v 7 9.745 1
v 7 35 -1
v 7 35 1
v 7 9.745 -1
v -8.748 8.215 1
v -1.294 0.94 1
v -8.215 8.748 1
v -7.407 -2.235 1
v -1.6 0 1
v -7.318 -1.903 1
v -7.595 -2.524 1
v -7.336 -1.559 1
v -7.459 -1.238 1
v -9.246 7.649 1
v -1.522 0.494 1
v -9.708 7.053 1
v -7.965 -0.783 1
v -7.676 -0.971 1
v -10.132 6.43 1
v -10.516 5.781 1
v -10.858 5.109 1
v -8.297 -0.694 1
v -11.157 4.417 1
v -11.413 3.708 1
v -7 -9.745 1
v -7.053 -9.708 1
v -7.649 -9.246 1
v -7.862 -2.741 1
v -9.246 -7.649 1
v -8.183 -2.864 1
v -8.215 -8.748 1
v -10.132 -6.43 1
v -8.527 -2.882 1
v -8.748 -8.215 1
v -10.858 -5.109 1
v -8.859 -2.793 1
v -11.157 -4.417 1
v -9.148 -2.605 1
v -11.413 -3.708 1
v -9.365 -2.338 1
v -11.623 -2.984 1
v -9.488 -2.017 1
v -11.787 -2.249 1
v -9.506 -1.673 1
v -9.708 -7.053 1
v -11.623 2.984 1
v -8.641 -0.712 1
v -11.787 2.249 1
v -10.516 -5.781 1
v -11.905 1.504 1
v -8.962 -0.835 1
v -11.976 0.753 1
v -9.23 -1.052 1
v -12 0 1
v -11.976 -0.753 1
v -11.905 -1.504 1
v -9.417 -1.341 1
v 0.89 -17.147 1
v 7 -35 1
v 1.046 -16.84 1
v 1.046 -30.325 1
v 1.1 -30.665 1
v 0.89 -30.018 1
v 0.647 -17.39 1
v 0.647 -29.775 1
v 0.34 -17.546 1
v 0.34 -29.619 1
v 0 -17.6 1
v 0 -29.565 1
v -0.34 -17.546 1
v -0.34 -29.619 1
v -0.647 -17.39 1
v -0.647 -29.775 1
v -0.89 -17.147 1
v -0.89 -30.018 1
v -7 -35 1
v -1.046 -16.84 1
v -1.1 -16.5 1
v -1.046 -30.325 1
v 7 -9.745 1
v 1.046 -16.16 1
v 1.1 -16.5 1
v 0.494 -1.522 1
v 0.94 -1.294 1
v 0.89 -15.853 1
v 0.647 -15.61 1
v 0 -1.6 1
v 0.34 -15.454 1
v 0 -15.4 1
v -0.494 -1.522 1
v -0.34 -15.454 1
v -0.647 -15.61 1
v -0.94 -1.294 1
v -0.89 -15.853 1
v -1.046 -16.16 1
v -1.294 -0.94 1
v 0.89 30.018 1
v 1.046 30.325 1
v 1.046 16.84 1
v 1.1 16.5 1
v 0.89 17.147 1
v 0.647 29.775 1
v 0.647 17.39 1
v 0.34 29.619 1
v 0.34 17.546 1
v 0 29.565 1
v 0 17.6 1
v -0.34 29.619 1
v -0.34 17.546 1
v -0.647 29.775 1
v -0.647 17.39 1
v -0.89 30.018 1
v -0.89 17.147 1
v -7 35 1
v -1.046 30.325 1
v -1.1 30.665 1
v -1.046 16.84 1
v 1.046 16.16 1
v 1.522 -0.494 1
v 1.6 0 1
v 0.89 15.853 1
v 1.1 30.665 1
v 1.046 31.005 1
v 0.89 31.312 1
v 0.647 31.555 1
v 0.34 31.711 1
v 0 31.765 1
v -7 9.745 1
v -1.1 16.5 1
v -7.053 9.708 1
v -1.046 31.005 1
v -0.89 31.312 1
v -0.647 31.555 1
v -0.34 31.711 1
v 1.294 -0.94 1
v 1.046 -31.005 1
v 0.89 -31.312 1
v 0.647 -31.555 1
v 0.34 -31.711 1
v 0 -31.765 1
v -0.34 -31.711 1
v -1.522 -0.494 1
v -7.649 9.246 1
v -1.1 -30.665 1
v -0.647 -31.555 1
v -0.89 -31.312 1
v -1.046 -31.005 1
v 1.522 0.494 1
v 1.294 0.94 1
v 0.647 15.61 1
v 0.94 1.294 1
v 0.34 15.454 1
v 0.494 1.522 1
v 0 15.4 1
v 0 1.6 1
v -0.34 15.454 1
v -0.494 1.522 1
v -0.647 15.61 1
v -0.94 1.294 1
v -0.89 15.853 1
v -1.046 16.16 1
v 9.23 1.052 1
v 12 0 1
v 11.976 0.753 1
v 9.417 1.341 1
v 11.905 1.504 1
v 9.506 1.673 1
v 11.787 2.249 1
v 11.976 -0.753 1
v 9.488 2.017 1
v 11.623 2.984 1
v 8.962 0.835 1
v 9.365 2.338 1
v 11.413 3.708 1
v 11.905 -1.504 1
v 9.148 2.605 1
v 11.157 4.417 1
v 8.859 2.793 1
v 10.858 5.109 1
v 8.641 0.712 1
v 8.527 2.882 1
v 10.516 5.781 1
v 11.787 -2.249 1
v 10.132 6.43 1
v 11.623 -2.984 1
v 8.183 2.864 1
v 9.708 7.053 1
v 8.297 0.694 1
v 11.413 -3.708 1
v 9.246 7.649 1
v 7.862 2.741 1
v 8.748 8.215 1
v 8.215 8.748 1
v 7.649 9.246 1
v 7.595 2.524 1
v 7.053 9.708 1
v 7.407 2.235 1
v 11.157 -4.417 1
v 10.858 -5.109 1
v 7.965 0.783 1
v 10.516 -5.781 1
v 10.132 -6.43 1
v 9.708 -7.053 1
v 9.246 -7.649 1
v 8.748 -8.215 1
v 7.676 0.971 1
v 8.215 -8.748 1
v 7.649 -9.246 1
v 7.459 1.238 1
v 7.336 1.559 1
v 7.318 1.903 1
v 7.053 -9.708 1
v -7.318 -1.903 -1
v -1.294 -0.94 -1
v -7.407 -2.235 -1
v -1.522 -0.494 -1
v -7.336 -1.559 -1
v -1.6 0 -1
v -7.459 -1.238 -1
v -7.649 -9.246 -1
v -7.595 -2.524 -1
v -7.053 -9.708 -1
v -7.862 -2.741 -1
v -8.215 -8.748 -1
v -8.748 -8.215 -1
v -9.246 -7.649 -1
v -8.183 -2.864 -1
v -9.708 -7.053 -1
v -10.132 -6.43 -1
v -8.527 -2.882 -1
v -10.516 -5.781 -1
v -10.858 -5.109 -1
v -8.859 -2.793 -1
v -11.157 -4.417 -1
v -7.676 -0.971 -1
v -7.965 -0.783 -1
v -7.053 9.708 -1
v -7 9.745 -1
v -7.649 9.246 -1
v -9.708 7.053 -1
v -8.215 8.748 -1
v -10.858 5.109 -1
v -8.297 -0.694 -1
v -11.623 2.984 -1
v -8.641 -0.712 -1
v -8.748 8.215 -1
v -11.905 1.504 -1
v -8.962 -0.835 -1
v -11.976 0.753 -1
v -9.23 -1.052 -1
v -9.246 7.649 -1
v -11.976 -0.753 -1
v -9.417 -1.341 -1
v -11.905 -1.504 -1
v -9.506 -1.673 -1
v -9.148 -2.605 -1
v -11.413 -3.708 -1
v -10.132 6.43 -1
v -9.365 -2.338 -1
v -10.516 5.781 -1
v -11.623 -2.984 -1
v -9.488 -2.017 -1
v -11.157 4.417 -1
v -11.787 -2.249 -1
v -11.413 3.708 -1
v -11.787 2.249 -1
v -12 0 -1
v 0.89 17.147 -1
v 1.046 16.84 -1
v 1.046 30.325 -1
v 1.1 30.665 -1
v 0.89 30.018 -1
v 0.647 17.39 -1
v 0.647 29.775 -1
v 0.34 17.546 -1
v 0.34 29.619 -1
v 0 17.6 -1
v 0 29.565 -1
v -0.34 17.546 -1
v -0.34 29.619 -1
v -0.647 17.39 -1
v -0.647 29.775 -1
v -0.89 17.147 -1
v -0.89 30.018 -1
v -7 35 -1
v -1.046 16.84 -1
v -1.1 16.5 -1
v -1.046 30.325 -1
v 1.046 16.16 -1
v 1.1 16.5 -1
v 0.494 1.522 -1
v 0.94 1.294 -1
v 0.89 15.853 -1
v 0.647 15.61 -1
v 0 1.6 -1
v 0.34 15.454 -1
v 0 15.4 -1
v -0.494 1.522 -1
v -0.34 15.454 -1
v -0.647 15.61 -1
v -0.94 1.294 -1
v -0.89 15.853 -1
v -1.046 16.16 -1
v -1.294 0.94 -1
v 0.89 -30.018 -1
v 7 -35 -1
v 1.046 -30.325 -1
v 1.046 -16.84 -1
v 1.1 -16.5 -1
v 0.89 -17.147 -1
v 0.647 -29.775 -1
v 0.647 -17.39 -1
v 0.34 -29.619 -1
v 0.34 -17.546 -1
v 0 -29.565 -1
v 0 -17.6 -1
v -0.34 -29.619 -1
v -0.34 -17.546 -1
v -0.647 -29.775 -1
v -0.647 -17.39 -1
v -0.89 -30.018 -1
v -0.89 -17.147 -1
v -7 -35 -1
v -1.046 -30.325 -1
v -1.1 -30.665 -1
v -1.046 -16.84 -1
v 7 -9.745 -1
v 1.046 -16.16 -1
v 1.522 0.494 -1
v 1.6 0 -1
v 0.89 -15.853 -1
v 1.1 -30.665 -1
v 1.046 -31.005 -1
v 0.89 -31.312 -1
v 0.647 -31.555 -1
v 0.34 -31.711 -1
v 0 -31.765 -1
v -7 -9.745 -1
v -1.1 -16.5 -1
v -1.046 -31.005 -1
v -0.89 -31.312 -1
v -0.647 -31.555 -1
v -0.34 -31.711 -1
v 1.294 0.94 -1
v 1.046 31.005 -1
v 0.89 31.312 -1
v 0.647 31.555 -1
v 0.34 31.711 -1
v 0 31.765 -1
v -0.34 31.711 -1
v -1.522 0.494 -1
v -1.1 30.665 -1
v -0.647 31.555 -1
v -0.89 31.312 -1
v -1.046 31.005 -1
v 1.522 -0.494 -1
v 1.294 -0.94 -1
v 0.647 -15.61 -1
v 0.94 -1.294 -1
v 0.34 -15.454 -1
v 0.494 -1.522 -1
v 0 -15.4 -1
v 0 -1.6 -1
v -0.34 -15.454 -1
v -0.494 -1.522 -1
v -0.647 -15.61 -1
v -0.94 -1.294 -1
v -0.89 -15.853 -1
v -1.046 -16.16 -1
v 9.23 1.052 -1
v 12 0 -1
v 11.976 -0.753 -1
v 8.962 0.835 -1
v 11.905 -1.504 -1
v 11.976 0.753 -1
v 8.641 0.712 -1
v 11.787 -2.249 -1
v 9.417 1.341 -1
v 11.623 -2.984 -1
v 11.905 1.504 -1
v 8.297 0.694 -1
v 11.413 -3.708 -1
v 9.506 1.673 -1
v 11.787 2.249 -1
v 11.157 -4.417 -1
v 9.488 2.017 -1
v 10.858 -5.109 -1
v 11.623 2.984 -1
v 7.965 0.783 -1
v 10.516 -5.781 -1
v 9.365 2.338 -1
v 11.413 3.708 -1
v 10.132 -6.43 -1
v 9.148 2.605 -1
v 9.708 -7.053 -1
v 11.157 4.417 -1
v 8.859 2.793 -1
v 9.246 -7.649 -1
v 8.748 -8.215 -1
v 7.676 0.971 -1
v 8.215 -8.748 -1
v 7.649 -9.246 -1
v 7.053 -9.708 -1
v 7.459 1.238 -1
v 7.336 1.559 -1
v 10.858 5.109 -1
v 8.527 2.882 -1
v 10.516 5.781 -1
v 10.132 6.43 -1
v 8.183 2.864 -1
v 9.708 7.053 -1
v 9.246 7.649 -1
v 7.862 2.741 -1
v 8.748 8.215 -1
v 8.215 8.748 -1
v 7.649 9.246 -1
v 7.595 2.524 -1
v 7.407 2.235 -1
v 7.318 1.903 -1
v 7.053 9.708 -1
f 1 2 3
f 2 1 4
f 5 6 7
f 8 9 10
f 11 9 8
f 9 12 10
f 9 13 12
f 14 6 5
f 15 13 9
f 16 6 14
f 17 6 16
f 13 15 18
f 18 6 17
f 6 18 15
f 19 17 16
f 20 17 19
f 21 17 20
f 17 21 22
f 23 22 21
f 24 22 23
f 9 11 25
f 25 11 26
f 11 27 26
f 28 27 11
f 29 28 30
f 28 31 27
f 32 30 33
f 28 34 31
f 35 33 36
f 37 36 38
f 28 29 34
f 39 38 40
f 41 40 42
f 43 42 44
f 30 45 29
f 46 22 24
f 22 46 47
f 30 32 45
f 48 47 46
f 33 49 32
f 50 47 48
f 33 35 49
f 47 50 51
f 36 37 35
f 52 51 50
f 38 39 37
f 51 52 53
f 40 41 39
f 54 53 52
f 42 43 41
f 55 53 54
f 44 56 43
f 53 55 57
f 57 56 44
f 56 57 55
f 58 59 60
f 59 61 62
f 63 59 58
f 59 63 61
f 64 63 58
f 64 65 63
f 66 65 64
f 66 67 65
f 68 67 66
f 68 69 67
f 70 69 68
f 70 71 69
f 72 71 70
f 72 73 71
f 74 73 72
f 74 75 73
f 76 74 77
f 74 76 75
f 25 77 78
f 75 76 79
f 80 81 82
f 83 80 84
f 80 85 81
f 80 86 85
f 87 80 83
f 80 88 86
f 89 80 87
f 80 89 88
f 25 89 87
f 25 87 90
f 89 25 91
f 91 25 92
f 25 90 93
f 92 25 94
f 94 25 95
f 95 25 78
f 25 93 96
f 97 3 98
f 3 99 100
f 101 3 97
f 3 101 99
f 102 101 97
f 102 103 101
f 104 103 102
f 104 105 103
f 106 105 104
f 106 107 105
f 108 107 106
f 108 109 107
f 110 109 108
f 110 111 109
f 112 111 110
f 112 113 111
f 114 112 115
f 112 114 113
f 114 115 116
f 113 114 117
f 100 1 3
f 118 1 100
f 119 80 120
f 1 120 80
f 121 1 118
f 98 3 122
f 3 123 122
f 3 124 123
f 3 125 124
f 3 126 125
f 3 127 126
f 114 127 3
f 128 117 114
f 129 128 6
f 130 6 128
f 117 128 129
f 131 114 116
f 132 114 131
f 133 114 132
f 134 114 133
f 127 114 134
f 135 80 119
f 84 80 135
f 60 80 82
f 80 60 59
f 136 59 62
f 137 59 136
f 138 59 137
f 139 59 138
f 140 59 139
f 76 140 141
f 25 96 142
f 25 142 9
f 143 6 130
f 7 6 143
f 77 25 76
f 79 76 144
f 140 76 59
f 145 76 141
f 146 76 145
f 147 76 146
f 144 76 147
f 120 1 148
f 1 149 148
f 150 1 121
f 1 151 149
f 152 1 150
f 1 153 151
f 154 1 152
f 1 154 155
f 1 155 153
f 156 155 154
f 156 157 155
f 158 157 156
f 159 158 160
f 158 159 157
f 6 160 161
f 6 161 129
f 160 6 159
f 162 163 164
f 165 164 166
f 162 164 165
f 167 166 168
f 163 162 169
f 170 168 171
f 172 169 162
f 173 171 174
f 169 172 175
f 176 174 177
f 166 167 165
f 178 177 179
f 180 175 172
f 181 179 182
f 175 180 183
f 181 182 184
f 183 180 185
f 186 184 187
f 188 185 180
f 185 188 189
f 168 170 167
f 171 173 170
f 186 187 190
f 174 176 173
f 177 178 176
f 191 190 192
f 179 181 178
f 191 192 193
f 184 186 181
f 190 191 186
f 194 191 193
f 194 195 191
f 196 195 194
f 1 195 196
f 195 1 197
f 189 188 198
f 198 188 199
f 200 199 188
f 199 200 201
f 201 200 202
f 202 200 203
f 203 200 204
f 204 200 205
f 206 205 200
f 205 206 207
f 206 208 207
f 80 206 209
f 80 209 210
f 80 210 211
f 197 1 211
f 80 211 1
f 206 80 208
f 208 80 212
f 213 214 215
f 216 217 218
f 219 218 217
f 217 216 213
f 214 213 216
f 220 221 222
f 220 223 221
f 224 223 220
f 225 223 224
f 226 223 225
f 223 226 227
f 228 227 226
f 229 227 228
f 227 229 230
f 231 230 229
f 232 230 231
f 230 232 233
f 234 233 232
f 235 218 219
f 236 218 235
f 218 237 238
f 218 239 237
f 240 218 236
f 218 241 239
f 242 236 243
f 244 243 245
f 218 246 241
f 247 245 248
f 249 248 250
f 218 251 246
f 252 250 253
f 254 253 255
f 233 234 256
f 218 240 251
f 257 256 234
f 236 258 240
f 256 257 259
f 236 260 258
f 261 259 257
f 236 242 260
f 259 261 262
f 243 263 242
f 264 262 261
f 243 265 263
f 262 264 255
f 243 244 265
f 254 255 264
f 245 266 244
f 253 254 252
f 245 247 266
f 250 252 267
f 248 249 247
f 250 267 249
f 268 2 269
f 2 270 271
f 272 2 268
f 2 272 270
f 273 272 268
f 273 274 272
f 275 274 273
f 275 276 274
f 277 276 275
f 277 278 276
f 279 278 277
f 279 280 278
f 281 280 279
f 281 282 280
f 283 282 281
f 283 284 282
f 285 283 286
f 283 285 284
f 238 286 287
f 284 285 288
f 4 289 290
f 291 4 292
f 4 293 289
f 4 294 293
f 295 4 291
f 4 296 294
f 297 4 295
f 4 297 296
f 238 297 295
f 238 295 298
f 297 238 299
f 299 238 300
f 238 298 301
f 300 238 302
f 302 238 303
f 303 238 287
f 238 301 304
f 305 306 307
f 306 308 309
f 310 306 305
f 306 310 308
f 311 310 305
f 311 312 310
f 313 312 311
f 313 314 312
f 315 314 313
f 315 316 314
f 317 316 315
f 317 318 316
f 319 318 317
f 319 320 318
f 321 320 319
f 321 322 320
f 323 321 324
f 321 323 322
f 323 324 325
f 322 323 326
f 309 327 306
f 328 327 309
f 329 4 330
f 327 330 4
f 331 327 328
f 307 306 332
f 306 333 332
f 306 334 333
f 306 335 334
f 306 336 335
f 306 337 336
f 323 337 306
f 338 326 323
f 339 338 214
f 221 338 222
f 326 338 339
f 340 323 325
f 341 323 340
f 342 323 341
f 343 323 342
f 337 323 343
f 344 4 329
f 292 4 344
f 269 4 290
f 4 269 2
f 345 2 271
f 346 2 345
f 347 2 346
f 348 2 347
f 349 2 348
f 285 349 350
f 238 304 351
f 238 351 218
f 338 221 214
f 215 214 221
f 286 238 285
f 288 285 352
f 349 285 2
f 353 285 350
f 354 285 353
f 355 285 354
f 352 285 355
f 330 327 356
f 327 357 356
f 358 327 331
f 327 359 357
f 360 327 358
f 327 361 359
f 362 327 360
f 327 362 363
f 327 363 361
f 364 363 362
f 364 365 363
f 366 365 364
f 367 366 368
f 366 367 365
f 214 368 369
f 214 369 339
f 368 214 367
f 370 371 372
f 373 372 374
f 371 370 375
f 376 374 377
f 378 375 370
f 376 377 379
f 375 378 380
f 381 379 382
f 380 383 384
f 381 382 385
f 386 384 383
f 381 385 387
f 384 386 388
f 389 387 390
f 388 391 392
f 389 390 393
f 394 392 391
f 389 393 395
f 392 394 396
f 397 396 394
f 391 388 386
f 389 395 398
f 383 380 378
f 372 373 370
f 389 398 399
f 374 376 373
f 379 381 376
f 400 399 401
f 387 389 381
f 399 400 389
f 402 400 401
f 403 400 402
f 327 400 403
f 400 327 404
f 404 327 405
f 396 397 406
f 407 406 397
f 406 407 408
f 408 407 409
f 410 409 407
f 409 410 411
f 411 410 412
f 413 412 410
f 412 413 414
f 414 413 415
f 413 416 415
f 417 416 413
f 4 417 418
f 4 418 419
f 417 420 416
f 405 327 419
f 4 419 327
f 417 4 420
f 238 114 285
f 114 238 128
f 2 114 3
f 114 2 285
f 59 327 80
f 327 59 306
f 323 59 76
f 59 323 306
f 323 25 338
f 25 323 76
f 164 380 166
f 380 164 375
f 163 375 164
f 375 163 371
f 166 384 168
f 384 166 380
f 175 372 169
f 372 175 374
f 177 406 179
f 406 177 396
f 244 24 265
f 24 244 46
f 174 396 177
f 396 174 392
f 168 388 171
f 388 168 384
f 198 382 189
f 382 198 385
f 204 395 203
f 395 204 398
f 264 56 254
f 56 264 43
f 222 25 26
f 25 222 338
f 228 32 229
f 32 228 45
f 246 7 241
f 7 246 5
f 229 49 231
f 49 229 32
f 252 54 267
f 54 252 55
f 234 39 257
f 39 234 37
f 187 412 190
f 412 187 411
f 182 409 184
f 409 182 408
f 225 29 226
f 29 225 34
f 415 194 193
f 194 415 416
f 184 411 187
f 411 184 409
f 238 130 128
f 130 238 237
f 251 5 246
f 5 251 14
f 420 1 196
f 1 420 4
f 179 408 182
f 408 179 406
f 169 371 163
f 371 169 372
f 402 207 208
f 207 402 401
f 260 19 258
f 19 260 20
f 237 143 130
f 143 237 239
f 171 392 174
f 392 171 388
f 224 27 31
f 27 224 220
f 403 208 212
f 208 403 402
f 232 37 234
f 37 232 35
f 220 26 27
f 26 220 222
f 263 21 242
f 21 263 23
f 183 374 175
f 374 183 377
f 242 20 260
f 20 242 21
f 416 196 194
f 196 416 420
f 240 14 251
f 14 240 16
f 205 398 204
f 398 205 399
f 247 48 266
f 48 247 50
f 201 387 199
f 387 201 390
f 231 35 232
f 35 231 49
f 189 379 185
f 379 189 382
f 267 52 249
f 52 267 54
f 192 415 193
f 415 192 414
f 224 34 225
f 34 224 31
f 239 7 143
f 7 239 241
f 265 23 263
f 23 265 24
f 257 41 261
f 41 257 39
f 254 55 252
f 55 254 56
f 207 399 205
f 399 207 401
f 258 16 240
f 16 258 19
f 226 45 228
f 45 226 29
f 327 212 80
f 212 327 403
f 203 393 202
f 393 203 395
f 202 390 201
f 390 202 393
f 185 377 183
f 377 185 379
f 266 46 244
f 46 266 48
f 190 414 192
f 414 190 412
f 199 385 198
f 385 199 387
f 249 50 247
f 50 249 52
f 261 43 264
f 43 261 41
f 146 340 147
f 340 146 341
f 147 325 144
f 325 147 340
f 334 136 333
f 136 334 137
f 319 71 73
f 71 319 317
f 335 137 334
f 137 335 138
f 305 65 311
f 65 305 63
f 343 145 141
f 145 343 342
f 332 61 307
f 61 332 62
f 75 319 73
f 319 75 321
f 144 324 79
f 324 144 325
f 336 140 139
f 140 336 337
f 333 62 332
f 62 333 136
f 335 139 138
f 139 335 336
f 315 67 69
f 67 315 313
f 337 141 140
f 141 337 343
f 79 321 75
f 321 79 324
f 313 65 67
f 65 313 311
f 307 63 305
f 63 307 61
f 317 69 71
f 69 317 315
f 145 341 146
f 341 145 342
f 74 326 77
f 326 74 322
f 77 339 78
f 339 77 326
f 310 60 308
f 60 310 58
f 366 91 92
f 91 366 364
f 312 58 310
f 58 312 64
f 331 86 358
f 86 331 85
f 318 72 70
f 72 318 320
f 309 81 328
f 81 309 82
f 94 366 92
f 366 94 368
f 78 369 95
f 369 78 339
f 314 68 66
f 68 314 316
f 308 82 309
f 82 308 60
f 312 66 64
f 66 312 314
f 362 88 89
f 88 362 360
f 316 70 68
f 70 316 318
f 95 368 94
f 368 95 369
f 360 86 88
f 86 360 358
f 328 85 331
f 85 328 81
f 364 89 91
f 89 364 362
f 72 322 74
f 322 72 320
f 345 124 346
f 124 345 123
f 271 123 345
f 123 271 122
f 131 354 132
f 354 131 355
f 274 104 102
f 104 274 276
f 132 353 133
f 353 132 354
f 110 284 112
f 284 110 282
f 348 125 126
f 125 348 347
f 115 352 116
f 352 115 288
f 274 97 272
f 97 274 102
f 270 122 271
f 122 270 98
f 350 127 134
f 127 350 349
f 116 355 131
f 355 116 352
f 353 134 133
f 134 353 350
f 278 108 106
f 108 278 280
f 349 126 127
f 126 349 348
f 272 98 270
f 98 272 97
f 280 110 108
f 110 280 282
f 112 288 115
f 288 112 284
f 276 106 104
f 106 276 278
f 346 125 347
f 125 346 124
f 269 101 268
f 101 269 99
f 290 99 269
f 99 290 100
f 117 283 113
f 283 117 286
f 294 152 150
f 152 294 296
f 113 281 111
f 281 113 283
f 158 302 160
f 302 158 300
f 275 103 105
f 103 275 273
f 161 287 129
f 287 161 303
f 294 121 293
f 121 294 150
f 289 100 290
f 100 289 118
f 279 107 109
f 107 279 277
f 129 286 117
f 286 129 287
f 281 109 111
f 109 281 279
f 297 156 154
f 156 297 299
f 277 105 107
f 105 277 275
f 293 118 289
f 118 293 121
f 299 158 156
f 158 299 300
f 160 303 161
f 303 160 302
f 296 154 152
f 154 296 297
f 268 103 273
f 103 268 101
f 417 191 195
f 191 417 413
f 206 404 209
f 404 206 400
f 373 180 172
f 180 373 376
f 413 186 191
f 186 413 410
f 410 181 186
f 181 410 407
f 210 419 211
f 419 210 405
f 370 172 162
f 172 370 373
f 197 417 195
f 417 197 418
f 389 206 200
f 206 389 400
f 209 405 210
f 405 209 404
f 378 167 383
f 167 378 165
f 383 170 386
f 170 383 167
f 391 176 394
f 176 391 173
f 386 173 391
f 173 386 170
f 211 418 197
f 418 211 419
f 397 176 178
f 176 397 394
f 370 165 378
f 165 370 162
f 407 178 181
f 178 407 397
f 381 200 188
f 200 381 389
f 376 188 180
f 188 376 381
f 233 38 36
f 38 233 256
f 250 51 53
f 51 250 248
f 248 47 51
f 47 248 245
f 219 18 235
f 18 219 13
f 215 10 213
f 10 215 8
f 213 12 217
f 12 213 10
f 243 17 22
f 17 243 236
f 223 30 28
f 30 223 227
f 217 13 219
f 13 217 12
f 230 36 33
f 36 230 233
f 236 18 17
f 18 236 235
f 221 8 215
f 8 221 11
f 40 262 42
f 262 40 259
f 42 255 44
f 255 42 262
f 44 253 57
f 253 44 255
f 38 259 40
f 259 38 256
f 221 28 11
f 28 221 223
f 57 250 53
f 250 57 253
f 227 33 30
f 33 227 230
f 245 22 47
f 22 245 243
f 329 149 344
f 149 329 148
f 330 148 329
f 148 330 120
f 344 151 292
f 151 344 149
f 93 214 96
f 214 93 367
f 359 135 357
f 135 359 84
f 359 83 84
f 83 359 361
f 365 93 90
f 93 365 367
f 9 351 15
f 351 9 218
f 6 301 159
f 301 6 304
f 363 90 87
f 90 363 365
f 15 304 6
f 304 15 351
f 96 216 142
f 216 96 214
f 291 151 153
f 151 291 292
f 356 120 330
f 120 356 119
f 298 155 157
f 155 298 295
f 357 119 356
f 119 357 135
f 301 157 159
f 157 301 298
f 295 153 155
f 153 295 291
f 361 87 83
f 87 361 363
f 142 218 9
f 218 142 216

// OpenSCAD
// file: ../../parameters.scad
global_clearance = 0.5;


//Main tube diameter - hole [mm]
main_tube_outer_diameter = 25.4;
main_tube_inner_diameter = 23.05;

// Nastavení parametrů rotoru

gliding_aggle = 14;         // tenhle úhel by se zřejmě v budoucnu měl počítat z požadované klouzavosti.

rotor_blade_AOA = 1.5;      // nastavení úhlu náběhu rotorového listu
rotor_blade_length = 970;   // délka rotorového listu
rotor_blade_depth = 50;     // hloubka rotorového listu
rotor_height = 180;         // výška otočného kloubu rotoru nad hlavní trubkou vírníku (odhad)
rotor_blades_count = 2;
rotor_delta_angle = 12;


rotor_head_width =  21.4;    //Rozměr 1 v nákresu
pilon_wall_thickness = 4.2;  // Rozměr 2 v nákresu
horizontal_screw_distance = 14.5;   // Rozměr 4 v nákresu
vertical_screw_distance = 12;       // rozměr 5 v nkresu

rotorhead_wall_thickness = 2; // sila tistenych dilu


bearing_outer_diameter = 7.1;    // Rozměr B1 v nákresu s přídavkem na toleranci otvoru
bearing_thickness = 3.1;        // Rozměr B2 v nákresu
bearing_shaft_length = 19.5;    // Rozměr B3 v nákresu


// nastavení parametrů motoru

engine_angle = -8;
engine_diameter = 55;
engine_offset = 55;

engine_screws_radius = 15;
engine_holes_radius = (24 + 44)/4;
engine_shatf_hole_diameter = 13;

// screw length step - minimum difference in length between two types of screws
basic_screw_length = 5;

//Screw diameter and nut for M5 [mm]
M5_screw_diameter=5.5;
M5_head_height = 5;
M5_head_diameter = 13+0.5;
M5_nut_height = 4.5;
M5_nut_diameter = 9.4;
M5_nut_pocket = 8.4;

//Screw diameter and nut for M4 [mm]
M4_screw_diameter=4.5;
M4_screw_head_height = 4;
M4_nut_height = 3.2;
M4_nut_diameter = 8.4;
M4_nut_pocket = 7.5;

//Screw diameter and nut for M3 [mm]
M3_screw_diameter = 3.2;
M3_nut_height = 2.7;
M3_nut_diameter = 6.6;
M3_screw_head_height = 3;
M3_nut_pocket = 5.6;


//Screw diameter and nut for M2,5 [mm]
M2_5_screw_diameter = 2.7;
M2_5_nut_height = 2.3;
M2_5_nut_diameter = 6;
M2_5_nut_pocket = 5.1;

//Screw diameter and nut for M2 [mm]
M2_screw_diameter = 2.2;
M2_nut_height = 1.8;
M2_nut_diameter = 4.5;
M2_nut_pocket = 3.95;



//šroub servo
Servo_screw = 1.5;
Servo_nut_height = 1;
Servo_nut_diameter = 2.7;



//center_of_gravity_position = [main_pilon_position - tan(gliding_aggle)*rotor_height, 0, 0];


////podzvozek

radius_undercarriage = 25;
vzdalenost_x = tan(20) * 131;
vzdalenost_y = (131 - radius_undercarriage)/tan(79);
uhel_y = 90 - 20;
uhel_x = 90 - 79;

maximum_printable_size = 150;


////Pitotova trubice
Pitot_tube_diameter = 4.02 + 1;
Distance_hole_from_tube = 11.92;  //vzdálenost otvoru pro připevnění od samotné trubičky
// file: ../888_1001.scad
//
//
//

include <../parameters.scad>

module 888_1001()
{
    angle_between_blades = 360 / rotor_blades_count;
    rotor_center_plate_size = 30;
    rotor_mounting_plate_size = 20;
    shaft_diameter = M3_screw_diameter;
    thickness = 2;
    blade_screws_distance = (16.47+11.86)/2;

    difference () {
        union () {
            cylinder(r = 3+9, h = thickness, center = true, $fn = 100);

            for (i = [0:rotor_blades_count]){
                rotate([0,0, i*angle_between_blades])
                    translate([0, 20, 0])
                        cube([14, 30, thickness], center = true);
            }
        }

        cylinder(d = shaft_diameter, h = 2* thickness, center = true, $fn = 20);


        for (i = [1:rotor_blades_count]){
            rotate([0,0, i*angle_between_blades])
                translate([0, 16.5 + blade_screws_distance/2, 0]) {
                    translate([0, blade_screws_distance/2, 0])
                        cylinder(d = M2_screw_diameter, h = 2* thickness, center = true, $fn = 20);
                    translate([0, -blade_screws_distance/2, 0])
                        cylinder(d = M2_screw_diameter, h = 2* thickness, center = true, $fn = 20);
                }
        }

        rotate([0,0, rotor_delta_angle])
        for (i = [1:rotor_blades_count]){
            rotate([0,0, i*angle_between_blades + angle_between_blades/2])
                translate([0, 3 + 4.5 + M2_screw_diameter/2, 0])
                    cylinder(d = M2_screw_diameter, h = 2* thickness, center = true, $fn = 20);
        }
    }
}

888_1001();
// main file
//
//
//

use <../888_1001.scad>

888_1001(hole_diameter=3.5);
